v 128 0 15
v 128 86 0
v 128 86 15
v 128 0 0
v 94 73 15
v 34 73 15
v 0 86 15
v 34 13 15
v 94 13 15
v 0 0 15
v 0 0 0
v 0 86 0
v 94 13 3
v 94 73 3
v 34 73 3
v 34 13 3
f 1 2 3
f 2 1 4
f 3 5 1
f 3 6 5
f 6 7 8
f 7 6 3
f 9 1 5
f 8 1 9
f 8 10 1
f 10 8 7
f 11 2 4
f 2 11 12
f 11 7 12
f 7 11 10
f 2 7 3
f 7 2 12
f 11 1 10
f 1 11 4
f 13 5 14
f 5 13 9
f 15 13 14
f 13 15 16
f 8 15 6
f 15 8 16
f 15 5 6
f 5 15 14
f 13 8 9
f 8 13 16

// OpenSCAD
// Generated by SolidPython 1.1.1 on 2021-06-16 16:01:40


difference() {
	cube(size = [128, 86, 15]);
	translate(v = [0, 0, 3]) {
		translate(v = [34.0000000000, 0, 0]) {
			translate(v = [0, 13.0000000000, 0]) {
				cube(size = [60, 60, 50.0]);
			}
		}
	}
}
